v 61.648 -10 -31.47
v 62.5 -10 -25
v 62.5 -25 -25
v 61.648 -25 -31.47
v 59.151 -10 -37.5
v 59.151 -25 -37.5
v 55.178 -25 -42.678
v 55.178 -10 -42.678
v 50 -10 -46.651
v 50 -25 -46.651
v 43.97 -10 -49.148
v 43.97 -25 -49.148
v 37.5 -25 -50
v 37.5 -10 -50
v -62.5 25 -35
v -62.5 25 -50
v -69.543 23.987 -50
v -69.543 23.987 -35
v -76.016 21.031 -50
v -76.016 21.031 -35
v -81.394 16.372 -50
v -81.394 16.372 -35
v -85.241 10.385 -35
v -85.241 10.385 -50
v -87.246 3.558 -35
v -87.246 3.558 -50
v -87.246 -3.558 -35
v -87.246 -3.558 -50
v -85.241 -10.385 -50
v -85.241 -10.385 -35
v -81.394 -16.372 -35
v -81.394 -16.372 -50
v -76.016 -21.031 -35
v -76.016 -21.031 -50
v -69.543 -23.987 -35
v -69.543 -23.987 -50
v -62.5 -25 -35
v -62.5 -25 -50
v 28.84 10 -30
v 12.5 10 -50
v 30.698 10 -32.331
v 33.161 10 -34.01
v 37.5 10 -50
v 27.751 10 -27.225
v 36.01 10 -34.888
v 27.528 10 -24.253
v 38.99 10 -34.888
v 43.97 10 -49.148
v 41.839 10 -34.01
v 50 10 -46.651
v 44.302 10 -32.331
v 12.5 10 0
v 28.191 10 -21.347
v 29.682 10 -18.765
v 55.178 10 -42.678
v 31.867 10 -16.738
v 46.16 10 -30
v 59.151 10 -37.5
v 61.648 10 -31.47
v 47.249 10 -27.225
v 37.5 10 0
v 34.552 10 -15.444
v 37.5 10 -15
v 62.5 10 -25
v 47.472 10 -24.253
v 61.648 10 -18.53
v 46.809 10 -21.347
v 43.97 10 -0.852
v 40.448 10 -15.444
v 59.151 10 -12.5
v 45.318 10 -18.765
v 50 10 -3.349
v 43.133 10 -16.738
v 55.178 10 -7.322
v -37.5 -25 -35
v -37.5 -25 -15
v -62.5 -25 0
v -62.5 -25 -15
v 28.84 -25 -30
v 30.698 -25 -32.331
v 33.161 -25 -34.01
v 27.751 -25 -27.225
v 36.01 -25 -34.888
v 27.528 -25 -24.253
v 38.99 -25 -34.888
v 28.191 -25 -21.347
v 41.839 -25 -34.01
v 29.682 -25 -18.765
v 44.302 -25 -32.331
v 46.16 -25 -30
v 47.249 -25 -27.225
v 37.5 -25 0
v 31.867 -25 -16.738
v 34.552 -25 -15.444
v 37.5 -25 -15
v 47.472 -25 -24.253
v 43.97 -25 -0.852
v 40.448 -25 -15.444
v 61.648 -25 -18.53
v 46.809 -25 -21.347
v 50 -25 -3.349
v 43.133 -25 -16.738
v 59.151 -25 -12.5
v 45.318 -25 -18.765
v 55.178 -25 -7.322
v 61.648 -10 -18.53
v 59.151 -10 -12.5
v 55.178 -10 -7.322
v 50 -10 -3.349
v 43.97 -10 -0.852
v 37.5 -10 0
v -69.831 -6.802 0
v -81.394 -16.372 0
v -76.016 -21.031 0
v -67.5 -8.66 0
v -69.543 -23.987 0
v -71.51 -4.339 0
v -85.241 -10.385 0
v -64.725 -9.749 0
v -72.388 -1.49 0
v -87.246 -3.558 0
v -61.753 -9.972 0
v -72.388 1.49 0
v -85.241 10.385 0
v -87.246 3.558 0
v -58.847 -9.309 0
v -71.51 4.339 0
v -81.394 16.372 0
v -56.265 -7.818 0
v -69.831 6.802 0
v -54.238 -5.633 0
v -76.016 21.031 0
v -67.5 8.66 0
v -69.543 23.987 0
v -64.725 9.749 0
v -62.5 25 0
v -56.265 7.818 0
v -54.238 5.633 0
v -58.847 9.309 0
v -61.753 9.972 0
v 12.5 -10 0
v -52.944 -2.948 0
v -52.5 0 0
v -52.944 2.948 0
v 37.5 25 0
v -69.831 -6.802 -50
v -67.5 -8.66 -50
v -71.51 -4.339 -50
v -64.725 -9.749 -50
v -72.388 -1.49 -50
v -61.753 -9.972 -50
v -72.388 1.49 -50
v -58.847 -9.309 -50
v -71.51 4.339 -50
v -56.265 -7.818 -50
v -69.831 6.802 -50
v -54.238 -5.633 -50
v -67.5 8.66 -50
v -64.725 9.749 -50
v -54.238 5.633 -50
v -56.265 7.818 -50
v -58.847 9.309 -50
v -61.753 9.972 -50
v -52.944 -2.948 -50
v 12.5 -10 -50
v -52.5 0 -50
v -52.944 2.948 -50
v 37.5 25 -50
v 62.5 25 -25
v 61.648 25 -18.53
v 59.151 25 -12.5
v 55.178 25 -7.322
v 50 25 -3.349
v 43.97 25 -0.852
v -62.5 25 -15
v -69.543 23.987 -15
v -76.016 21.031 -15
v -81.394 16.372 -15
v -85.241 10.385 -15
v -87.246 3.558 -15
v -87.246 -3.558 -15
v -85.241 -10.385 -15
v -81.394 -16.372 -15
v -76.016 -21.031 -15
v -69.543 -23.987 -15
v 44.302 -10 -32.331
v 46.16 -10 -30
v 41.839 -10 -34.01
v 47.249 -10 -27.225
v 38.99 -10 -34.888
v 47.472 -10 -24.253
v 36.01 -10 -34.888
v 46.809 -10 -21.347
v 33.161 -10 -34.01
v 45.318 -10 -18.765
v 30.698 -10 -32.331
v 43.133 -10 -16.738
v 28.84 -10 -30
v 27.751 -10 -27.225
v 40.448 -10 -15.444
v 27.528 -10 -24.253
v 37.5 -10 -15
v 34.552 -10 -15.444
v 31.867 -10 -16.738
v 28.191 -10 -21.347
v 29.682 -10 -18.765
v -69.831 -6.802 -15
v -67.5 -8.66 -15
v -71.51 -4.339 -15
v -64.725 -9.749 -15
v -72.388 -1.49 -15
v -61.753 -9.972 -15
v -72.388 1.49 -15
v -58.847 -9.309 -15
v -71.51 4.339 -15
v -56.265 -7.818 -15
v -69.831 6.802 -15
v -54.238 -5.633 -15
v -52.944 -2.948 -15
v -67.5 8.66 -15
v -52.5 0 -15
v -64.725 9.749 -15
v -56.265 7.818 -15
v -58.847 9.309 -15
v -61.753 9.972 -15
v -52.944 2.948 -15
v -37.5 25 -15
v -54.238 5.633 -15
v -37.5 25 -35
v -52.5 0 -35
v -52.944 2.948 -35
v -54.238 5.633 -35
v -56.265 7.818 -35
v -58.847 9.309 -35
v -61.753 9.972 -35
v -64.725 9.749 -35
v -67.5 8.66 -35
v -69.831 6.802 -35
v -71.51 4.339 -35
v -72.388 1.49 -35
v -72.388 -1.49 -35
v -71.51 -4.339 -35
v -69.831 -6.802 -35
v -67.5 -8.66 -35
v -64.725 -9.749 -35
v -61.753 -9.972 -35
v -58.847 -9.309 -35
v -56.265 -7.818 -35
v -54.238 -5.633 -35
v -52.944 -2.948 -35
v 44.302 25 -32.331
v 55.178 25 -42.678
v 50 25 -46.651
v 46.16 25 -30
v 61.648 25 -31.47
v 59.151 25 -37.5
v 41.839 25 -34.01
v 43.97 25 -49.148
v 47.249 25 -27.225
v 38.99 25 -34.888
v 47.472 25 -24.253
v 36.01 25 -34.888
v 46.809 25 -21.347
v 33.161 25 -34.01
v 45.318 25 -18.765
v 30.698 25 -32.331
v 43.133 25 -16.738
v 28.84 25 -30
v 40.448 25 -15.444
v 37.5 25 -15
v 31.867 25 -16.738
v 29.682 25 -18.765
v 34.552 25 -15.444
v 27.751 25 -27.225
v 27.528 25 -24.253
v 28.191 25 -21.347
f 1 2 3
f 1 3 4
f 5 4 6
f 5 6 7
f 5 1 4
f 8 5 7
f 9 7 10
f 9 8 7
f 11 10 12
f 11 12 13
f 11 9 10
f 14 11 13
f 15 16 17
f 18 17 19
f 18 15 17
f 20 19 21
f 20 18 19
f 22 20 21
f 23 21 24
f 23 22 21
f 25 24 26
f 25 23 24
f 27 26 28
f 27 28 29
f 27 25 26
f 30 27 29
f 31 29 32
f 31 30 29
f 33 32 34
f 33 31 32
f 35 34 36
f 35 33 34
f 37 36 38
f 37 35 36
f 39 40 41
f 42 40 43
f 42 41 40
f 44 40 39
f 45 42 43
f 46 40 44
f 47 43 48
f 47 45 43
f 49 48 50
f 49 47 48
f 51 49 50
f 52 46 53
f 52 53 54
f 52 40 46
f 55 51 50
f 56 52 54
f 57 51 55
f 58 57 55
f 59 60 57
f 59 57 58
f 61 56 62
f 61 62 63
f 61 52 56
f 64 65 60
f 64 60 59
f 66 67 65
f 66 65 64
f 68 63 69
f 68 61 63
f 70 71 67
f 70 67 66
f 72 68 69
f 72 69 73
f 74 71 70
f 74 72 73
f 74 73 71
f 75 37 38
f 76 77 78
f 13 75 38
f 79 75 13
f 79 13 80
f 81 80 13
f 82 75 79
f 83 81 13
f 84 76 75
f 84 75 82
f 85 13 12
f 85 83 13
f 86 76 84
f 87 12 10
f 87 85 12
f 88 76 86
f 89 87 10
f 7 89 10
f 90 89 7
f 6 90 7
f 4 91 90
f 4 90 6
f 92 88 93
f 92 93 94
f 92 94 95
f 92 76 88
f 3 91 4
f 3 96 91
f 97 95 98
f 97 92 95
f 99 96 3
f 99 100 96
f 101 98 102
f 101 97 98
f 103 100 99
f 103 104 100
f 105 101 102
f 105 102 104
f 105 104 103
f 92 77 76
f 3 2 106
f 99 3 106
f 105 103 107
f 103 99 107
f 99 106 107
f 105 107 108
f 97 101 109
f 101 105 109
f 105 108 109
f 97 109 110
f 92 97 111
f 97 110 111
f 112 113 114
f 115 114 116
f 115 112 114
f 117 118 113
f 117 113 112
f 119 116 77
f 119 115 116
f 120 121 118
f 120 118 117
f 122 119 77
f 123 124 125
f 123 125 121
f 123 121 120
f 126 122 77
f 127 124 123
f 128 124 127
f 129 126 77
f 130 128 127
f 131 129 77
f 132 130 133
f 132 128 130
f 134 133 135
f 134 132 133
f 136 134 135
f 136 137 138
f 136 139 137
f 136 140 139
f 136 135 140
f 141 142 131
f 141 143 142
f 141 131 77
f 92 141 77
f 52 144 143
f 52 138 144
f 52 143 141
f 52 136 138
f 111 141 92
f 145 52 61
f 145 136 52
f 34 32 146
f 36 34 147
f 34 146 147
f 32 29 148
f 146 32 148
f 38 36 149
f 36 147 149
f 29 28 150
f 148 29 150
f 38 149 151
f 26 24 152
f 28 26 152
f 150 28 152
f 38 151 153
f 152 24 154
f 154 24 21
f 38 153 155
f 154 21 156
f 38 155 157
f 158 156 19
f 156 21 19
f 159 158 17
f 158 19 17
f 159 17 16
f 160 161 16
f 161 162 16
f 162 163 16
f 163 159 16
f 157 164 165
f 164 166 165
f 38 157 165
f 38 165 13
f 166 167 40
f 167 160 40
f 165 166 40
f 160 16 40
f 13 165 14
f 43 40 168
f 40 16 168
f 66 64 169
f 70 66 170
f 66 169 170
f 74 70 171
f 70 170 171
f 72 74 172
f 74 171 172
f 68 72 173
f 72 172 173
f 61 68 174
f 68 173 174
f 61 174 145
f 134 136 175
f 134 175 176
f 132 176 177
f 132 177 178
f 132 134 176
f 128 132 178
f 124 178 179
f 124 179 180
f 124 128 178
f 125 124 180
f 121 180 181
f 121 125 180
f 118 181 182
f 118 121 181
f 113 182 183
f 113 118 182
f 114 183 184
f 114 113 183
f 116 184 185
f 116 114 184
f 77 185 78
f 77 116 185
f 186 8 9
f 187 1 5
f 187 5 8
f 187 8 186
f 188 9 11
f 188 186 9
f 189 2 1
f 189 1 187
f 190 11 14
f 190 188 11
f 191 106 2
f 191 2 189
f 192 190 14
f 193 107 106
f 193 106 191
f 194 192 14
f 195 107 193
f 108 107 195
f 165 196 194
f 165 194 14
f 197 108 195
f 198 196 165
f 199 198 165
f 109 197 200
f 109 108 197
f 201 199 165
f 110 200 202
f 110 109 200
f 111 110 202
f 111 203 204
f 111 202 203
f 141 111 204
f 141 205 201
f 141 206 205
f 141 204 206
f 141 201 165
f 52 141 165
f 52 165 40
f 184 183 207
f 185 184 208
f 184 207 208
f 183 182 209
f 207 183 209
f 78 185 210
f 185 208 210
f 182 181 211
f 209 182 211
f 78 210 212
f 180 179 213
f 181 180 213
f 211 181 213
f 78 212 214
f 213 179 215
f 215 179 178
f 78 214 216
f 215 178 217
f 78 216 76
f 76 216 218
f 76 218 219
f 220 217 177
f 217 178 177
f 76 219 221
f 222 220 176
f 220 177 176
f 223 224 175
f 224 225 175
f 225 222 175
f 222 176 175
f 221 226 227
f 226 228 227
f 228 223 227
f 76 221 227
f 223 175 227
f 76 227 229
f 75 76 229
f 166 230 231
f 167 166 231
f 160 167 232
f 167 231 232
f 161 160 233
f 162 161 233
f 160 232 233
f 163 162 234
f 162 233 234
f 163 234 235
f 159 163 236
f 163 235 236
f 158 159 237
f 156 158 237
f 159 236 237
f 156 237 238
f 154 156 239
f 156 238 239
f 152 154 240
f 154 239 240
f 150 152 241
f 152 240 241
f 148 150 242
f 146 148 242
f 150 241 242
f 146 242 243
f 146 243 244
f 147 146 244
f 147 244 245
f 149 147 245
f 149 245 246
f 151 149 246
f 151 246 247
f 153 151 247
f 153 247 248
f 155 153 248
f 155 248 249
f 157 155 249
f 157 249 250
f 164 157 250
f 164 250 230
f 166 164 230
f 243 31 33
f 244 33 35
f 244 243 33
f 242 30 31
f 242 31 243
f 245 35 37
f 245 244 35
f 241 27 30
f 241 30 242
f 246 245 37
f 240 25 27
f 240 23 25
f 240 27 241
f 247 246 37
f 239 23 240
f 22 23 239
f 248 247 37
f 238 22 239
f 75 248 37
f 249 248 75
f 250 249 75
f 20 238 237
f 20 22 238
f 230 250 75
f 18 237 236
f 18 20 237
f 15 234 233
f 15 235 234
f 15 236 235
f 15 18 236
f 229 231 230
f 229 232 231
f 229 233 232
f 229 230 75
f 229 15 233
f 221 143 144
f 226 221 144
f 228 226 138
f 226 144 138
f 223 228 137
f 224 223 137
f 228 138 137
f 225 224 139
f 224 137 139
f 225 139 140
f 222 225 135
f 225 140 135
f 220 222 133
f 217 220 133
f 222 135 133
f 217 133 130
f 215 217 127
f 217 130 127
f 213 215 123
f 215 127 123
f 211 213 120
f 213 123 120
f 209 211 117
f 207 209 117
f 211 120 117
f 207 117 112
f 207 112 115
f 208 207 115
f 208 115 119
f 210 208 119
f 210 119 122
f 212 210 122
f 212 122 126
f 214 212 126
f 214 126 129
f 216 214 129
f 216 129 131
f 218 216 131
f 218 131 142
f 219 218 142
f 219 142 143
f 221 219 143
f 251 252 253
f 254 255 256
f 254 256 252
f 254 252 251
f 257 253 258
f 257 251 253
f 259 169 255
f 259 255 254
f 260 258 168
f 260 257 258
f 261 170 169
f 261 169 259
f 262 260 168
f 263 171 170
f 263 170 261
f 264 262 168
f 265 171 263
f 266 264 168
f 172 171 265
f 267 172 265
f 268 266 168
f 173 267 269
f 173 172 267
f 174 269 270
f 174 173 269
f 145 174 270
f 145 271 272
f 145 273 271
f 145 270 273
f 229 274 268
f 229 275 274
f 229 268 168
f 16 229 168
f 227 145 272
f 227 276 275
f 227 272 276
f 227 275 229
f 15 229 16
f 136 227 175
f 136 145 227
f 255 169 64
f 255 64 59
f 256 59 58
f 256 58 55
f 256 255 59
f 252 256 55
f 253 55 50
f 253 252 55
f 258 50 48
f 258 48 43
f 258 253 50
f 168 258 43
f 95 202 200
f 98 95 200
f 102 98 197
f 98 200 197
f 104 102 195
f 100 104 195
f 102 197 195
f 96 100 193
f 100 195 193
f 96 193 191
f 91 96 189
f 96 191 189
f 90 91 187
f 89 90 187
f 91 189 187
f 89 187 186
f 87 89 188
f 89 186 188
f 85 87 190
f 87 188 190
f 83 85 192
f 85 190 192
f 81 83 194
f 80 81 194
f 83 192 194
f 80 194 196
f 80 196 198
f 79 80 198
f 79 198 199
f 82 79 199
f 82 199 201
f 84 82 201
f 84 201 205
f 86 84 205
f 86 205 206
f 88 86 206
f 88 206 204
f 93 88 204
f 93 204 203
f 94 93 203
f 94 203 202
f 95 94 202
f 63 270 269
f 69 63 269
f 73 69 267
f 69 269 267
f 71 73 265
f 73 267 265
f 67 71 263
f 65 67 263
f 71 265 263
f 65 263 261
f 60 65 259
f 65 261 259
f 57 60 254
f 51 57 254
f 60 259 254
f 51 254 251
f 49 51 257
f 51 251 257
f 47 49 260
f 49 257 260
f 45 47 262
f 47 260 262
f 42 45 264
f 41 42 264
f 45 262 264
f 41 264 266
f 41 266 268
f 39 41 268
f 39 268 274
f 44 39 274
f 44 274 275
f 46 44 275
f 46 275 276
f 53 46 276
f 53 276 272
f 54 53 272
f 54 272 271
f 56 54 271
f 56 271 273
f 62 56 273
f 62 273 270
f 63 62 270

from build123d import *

# Parameters (mm, degrees)
SKETCH1_R           = 10
BOSS_EXTRUDE1_DEPTH = 50
CUT_EXTRUDE6_DEPTH  = 86
CUT_EXTRUDE7_DEPTH  = 86
SKETCH4_R           = 10
CUT_EXTRUDE8_DEPTH  = 86
SKETCH5_W           = 50
SKETCH5_H           = 20
CUT_EXTRUDE9_DEPTH  = 86


with BuildPart() as part:
    # Sketch1 → Boss-Extrude1 (new body)
    with BuildSketch(Plane.XY):
        with BuildLine():
            Line((12.5, 10), (62.5, 10))
            Line((62.5, 10), (62.5, 25))
            Line((62.5, 25), (-62.5, 25))
            ThreePointArc((-62.5, 25), (-87.5, 0), (-62.5, -25))
            Line((-62.5, -25), (62.5, -25))
            Line((62.5, -25), (62.5, -10))
            Line((62.5, -10), (12.5, -10))
            Line((12.5, -10), (12.5, 10))
        make_face()
        with Locations((-62.5, 0)):
            Circle(SKETCH1_R, mode=Mode.SUBTRACT)
    extrude(amount=-BOSS_EXTRUDE1_DEPTH)

    # Sketch2 → Cut-Extrude6 (cut)
    with BuildSketch(Plane(origin=(0, 25, 0), x_dir=(1, 0, 0), z_dir=(0, 1, 0))):
        with BuildLine():
            Line((37.5, 50), (62.5, 50))
            Line((62.5, 50), (62.5, 25))
            ThreePointArc((62.5, 25), (55.17766953, 42.67766953), (37.5, 50))
        make_face()
    extrude(amount=-CUT_EXTRUDE6_DEPTH, mode=Mode.SUBTRACT)

    # Sketch3 → Cut-Extrude7 (cut)
    with BuildSketch(Plane(origin=(0, 25, 0), x_dir=(1, 0, 0), z_dir=(0, 1, 0))):
        with BuildLine():
            Line((37.5, 0), (62.5, 0))
            Line((62.5, 0), (62.5, 25))
            ThreePointArc((62.5, 25), (55.17766953, 7.32233047), (37.5, 0))
        make_face()
    extrude(amount=-CUT_EXTRUDE7_DEPTH, mode=Mode.SUBTRACT)

    # Sketch4 → Cut-Extrude8 (cut)
    with BuildSketch(Plane(origin=(0, 25, 0), x_dir=(1, 0, 0), z_dir=(0, 1, 0))):
        with Locations(Location((37.5, 25, 0), (0, 0, 270))):
            Circle(SKETCH4_R)
    extrude(amount=-CUT_EXTRUDE8_DEPTH, mode=Mode.SUBTRACT)

    # Sketch5 → Cut-Extrude9 (cut)
    with BuildSketch(Plane(origin=(0, 25, 0), x_dir=(1, 0, 0), z_dir=(0, 1, 0))):
        with Locations((-62.5, 25)):
            Rectangle(SKETCH5_W, SKETCH5_H)
    extrude(amount=-CUT_EXTRUDE9_DEPTH, mode=Mode.SUBTRACT)


solid = part.part
